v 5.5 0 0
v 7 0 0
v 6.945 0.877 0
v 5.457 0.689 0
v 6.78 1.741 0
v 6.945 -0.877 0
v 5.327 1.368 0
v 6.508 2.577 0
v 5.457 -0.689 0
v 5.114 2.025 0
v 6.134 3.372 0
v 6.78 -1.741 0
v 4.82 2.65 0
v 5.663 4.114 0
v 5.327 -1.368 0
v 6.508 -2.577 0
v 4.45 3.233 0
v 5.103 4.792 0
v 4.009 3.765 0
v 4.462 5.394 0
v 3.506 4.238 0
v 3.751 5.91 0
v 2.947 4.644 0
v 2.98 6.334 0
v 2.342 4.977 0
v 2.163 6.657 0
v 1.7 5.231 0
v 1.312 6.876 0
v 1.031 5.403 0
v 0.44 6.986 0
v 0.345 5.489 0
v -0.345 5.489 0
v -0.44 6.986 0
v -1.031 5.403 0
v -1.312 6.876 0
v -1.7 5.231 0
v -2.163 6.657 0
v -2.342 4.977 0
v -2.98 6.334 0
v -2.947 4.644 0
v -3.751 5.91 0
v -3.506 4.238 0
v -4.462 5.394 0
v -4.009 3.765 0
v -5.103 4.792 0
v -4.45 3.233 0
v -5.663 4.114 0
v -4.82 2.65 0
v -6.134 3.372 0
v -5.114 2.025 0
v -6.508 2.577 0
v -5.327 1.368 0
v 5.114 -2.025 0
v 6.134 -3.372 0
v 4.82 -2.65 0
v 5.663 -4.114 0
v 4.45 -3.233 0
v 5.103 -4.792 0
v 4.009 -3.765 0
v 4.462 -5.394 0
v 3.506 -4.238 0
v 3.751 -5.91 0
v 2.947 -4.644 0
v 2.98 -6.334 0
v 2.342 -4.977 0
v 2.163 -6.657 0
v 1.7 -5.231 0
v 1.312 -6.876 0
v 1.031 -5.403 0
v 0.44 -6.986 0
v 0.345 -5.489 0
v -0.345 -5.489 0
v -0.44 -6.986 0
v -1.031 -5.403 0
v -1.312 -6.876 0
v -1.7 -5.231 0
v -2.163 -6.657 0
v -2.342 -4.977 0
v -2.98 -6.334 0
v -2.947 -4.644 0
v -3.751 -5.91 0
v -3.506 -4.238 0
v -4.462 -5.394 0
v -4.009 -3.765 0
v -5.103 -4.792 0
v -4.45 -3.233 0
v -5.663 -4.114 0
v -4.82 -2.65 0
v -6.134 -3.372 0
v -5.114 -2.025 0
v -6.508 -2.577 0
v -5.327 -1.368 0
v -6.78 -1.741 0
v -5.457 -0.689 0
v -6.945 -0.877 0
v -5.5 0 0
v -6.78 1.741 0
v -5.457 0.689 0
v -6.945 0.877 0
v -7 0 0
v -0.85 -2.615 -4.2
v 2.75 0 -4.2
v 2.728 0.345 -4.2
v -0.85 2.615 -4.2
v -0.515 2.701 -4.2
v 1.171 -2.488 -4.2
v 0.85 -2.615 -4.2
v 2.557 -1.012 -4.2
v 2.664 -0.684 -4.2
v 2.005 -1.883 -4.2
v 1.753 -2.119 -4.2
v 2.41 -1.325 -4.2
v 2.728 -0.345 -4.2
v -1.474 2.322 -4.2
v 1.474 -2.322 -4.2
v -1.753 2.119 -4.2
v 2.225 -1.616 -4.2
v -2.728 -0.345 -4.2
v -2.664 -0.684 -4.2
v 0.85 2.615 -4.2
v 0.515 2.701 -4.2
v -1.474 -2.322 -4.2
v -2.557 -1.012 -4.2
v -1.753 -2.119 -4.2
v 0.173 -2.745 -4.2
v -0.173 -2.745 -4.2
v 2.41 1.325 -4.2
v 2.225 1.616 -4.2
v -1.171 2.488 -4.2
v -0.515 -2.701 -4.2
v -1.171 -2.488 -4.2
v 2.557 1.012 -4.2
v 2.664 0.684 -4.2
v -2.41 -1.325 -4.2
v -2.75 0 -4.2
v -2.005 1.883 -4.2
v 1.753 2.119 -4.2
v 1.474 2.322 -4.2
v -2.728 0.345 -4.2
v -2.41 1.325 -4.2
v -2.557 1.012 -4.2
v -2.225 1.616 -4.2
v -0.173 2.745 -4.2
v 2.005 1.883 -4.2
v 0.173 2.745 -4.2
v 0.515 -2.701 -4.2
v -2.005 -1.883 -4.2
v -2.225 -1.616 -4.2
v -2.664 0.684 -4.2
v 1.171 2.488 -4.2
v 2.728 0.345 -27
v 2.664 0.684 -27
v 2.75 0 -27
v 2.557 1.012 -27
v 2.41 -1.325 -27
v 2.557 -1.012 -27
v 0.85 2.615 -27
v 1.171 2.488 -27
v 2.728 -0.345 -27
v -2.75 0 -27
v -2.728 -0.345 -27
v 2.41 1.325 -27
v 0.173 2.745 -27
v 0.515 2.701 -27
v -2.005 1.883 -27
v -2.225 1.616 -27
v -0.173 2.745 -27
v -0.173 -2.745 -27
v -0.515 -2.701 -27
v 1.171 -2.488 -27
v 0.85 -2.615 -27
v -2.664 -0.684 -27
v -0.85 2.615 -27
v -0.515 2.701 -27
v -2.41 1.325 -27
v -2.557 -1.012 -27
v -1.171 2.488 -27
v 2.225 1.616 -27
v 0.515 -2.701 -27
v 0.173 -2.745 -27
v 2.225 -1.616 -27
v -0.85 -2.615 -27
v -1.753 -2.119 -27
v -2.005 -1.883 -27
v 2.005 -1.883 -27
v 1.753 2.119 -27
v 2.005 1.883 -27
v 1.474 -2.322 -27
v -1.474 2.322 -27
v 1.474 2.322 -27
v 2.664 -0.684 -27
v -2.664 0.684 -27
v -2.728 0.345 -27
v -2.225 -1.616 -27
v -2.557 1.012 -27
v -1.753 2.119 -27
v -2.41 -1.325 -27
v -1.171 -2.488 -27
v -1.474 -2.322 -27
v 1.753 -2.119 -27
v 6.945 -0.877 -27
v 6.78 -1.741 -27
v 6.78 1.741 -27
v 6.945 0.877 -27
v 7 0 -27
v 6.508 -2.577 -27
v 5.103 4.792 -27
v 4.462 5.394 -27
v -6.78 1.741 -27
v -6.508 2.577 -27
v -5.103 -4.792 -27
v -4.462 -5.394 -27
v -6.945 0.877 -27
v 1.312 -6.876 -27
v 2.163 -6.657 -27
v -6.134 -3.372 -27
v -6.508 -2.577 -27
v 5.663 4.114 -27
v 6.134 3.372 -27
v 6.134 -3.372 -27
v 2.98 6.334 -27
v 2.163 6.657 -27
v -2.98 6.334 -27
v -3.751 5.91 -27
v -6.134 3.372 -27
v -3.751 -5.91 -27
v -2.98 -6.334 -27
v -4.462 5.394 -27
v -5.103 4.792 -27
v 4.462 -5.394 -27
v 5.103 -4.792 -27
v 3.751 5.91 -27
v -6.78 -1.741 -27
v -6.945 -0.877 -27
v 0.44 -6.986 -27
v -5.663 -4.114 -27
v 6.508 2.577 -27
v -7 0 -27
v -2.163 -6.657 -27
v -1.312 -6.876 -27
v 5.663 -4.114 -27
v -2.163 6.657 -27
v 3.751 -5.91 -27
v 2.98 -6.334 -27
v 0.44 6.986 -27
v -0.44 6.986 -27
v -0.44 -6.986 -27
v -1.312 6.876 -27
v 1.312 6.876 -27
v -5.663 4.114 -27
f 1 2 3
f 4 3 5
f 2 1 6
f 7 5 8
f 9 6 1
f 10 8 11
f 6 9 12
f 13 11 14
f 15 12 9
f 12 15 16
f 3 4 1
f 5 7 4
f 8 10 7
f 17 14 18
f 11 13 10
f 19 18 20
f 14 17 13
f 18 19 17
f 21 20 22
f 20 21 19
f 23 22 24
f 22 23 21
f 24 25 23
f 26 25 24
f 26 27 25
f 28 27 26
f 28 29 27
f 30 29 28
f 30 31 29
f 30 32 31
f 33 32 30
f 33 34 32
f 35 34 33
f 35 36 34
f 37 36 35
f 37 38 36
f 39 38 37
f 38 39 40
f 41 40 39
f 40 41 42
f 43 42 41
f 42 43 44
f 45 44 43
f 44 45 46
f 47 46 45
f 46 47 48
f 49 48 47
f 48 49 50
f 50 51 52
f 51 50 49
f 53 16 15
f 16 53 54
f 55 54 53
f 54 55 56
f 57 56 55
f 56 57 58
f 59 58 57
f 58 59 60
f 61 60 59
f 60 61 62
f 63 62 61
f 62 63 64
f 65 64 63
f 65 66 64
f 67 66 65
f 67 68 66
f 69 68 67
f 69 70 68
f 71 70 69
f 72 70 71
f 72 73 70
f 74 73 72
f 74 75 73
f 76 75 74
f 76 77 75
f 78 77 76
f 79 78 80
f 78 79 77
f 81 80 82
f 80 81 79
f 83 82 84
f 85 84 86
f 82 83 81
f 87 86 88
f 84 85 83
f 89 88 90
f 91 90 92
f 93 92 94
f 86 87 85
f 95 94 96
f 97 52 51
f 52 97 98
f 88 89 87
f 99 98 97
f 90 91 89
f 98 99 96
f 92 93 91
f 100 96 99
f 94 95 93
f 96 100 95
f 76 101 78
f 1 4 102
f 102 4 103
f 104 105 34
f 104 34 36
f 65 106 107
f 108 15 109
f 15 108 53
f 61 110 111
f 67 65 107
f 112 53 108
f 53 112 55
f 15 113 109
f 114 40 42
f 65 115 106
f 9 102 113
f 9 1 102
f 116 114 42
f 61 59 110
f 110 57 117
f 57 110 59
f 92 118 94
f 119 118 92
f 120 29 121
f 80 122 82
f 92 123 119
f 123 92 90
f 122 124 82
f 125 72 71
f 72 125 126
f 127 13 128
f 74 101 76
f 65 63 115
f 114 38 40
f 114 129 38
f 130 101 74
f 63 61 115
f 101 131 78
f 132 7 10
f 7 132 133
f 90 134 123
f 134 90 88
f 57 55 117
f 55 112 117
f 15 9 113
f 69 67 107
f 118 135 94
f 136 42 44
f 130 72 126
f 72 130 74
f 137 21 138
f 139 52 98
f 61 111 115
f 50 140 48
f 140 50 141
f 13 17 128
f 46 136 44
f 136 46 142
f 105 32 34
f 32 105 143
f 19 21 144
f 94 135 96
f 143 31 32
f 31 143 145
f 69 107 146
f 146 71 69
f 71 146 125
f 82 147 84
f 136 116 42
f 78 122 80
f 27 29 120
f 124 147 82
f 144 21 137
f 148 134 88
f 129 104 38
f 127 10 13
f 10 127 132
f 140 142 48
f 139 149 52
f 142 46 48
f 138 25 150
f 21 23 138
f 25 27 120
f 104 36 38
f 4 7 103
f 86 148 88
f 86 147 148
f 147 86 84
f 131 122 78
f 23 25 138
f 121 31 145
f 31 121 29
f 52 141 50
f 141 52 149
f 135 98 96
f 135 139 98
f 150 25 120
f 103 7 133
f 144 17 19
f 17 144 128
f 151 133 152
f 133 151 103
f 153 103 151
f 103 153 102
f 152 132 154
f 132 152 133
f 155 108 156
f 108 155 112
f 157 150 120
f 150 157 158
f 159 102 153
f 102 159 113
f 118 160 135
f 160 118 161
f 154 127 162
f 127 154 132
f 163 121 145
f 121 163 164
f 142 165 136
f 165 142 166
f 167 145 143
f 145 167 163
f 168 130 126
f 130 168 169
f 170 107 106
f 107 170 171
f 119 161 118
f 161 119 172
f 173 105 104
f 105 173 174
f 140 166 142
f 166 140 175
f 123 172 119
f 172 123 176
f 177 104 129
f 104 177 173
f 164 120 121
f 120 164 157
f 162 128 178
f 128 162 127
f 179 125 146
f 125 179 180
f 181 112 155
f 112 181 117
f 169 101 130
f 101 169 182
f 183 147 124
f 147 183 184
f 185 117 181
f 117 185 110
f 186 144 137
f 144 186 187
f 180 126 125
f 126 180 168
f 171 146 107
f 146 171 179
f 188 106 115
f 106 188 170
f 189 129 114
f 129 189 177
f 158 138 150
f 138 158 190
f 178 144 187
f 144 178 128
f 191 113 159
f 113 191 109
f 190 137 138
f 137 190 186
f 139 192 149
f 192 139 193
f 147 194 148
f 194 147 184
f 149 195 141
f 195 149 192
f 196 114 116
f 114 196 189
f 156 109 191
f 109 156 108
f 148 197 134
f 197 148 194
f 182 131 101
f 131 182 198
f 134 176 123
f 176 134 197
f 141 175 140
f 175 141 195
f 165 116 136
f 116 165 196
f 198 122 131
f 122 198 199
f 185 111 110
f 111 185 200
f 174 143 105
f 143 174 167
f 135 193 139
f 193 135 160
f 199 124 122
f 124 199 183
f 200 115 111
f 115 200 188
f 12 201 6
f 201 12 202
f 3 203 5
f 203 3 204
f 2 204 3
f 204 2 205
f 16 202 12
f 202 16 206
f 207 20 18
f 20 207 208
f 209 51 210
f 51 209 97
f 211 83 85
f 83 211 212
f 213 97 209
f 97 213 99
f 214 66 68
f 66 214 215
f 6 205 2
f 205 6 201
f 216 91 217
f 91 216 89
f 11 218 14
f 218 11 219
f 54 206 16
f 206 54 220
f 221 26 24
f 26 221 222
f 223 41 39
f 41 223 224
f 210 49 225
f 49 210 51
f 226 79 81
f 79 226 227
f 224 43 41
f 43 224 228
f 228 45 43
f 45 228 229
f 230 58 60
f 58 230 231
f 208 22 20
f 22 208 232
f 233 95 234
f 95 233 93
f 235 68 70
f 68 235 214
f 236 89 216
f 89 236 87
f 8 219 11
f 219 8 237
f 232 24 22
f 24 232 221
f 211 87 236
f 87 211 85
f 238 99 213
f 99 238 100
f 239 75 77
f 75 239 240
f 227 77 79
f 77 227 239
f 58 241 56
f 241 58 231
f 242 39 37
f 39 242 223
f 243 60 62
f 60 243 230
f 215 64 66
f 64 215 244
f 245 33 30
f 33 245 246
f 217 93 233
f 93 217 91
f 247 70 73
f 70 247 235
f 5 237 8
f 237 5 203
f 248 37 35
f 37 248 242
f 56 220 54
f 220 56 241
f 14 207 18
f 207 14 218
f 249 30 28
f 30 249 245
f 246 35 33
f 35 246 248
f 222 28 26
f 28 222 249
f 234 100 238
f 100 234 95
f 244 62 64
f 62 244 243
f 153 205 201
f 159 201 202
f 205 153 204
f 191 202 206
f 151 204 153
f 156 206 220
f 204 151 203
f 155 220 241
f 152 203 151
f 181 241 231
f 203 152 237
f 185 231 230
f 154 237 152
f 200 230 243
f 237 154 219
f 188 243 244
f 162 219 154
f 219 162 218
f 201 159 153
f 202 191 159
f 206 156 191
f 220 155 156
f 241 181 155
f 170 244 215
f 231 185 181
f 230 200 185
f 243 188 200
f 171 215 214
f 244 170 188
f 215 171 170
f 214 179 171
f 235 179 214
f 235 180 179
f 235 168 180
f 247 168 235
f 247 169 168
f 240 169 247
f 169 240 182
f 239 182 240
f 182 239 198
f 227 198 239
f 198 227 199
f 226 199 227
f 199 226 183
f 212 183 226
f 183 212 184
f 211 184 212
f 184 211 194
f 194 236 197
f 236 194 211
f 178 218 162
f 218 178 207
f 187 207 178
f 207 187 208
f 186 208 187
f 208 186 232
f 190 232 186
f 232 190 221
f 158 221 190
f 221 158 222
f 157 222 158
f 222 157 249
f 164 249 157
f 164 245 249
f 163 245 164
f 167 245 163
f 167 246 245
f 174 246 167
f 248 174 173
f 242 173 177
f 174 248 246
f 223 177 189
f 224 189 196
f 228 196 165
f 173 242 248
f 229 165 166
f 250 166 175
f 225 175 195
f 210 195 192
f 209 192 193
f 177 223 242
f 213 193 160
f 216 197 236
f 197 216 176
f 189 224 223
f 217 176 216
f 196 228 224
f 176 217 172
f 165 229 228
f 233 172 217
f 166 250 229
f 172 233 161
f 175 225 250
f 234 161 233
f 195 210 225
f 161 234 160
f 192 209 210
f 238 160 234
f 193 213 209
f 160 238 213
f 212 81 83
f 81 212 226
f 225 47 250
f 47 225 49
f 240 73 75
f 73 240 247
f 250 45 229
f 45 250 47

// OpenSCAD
$fn = 50;


difference() {
	union() {
		translate(v = [0, 0, -27.0000000000]) {
			cylinder(h = 27, r = 7.0000000000);
		}
	}
	union() {
		translate(v = [0, 0, 0]) {
			rotate(a = [0, 0, 0]) {
				difference() {
					union() {
						translate(v = [0, 0, -30.0000000000]) {
							cylinder(h = 30, r = 2.2500000000);
						}
						translate(v = [0, 0, -4.2000000000]) {
							cylinder(h = 4.2000000000, r1 = 2.7500000000, r2 = 5.5000000000);
						}
						translate(v = [0, 0, -30.0000000000]) {
							cylinder(h = 30, r = 2.7500000000);
						}
						translate(v = [0, 0, -30.0000000000]) {
							cylinder(h = 30, r = 2.2500000000);
						}
					}
					union();
				}
			}
		}
	}
}
